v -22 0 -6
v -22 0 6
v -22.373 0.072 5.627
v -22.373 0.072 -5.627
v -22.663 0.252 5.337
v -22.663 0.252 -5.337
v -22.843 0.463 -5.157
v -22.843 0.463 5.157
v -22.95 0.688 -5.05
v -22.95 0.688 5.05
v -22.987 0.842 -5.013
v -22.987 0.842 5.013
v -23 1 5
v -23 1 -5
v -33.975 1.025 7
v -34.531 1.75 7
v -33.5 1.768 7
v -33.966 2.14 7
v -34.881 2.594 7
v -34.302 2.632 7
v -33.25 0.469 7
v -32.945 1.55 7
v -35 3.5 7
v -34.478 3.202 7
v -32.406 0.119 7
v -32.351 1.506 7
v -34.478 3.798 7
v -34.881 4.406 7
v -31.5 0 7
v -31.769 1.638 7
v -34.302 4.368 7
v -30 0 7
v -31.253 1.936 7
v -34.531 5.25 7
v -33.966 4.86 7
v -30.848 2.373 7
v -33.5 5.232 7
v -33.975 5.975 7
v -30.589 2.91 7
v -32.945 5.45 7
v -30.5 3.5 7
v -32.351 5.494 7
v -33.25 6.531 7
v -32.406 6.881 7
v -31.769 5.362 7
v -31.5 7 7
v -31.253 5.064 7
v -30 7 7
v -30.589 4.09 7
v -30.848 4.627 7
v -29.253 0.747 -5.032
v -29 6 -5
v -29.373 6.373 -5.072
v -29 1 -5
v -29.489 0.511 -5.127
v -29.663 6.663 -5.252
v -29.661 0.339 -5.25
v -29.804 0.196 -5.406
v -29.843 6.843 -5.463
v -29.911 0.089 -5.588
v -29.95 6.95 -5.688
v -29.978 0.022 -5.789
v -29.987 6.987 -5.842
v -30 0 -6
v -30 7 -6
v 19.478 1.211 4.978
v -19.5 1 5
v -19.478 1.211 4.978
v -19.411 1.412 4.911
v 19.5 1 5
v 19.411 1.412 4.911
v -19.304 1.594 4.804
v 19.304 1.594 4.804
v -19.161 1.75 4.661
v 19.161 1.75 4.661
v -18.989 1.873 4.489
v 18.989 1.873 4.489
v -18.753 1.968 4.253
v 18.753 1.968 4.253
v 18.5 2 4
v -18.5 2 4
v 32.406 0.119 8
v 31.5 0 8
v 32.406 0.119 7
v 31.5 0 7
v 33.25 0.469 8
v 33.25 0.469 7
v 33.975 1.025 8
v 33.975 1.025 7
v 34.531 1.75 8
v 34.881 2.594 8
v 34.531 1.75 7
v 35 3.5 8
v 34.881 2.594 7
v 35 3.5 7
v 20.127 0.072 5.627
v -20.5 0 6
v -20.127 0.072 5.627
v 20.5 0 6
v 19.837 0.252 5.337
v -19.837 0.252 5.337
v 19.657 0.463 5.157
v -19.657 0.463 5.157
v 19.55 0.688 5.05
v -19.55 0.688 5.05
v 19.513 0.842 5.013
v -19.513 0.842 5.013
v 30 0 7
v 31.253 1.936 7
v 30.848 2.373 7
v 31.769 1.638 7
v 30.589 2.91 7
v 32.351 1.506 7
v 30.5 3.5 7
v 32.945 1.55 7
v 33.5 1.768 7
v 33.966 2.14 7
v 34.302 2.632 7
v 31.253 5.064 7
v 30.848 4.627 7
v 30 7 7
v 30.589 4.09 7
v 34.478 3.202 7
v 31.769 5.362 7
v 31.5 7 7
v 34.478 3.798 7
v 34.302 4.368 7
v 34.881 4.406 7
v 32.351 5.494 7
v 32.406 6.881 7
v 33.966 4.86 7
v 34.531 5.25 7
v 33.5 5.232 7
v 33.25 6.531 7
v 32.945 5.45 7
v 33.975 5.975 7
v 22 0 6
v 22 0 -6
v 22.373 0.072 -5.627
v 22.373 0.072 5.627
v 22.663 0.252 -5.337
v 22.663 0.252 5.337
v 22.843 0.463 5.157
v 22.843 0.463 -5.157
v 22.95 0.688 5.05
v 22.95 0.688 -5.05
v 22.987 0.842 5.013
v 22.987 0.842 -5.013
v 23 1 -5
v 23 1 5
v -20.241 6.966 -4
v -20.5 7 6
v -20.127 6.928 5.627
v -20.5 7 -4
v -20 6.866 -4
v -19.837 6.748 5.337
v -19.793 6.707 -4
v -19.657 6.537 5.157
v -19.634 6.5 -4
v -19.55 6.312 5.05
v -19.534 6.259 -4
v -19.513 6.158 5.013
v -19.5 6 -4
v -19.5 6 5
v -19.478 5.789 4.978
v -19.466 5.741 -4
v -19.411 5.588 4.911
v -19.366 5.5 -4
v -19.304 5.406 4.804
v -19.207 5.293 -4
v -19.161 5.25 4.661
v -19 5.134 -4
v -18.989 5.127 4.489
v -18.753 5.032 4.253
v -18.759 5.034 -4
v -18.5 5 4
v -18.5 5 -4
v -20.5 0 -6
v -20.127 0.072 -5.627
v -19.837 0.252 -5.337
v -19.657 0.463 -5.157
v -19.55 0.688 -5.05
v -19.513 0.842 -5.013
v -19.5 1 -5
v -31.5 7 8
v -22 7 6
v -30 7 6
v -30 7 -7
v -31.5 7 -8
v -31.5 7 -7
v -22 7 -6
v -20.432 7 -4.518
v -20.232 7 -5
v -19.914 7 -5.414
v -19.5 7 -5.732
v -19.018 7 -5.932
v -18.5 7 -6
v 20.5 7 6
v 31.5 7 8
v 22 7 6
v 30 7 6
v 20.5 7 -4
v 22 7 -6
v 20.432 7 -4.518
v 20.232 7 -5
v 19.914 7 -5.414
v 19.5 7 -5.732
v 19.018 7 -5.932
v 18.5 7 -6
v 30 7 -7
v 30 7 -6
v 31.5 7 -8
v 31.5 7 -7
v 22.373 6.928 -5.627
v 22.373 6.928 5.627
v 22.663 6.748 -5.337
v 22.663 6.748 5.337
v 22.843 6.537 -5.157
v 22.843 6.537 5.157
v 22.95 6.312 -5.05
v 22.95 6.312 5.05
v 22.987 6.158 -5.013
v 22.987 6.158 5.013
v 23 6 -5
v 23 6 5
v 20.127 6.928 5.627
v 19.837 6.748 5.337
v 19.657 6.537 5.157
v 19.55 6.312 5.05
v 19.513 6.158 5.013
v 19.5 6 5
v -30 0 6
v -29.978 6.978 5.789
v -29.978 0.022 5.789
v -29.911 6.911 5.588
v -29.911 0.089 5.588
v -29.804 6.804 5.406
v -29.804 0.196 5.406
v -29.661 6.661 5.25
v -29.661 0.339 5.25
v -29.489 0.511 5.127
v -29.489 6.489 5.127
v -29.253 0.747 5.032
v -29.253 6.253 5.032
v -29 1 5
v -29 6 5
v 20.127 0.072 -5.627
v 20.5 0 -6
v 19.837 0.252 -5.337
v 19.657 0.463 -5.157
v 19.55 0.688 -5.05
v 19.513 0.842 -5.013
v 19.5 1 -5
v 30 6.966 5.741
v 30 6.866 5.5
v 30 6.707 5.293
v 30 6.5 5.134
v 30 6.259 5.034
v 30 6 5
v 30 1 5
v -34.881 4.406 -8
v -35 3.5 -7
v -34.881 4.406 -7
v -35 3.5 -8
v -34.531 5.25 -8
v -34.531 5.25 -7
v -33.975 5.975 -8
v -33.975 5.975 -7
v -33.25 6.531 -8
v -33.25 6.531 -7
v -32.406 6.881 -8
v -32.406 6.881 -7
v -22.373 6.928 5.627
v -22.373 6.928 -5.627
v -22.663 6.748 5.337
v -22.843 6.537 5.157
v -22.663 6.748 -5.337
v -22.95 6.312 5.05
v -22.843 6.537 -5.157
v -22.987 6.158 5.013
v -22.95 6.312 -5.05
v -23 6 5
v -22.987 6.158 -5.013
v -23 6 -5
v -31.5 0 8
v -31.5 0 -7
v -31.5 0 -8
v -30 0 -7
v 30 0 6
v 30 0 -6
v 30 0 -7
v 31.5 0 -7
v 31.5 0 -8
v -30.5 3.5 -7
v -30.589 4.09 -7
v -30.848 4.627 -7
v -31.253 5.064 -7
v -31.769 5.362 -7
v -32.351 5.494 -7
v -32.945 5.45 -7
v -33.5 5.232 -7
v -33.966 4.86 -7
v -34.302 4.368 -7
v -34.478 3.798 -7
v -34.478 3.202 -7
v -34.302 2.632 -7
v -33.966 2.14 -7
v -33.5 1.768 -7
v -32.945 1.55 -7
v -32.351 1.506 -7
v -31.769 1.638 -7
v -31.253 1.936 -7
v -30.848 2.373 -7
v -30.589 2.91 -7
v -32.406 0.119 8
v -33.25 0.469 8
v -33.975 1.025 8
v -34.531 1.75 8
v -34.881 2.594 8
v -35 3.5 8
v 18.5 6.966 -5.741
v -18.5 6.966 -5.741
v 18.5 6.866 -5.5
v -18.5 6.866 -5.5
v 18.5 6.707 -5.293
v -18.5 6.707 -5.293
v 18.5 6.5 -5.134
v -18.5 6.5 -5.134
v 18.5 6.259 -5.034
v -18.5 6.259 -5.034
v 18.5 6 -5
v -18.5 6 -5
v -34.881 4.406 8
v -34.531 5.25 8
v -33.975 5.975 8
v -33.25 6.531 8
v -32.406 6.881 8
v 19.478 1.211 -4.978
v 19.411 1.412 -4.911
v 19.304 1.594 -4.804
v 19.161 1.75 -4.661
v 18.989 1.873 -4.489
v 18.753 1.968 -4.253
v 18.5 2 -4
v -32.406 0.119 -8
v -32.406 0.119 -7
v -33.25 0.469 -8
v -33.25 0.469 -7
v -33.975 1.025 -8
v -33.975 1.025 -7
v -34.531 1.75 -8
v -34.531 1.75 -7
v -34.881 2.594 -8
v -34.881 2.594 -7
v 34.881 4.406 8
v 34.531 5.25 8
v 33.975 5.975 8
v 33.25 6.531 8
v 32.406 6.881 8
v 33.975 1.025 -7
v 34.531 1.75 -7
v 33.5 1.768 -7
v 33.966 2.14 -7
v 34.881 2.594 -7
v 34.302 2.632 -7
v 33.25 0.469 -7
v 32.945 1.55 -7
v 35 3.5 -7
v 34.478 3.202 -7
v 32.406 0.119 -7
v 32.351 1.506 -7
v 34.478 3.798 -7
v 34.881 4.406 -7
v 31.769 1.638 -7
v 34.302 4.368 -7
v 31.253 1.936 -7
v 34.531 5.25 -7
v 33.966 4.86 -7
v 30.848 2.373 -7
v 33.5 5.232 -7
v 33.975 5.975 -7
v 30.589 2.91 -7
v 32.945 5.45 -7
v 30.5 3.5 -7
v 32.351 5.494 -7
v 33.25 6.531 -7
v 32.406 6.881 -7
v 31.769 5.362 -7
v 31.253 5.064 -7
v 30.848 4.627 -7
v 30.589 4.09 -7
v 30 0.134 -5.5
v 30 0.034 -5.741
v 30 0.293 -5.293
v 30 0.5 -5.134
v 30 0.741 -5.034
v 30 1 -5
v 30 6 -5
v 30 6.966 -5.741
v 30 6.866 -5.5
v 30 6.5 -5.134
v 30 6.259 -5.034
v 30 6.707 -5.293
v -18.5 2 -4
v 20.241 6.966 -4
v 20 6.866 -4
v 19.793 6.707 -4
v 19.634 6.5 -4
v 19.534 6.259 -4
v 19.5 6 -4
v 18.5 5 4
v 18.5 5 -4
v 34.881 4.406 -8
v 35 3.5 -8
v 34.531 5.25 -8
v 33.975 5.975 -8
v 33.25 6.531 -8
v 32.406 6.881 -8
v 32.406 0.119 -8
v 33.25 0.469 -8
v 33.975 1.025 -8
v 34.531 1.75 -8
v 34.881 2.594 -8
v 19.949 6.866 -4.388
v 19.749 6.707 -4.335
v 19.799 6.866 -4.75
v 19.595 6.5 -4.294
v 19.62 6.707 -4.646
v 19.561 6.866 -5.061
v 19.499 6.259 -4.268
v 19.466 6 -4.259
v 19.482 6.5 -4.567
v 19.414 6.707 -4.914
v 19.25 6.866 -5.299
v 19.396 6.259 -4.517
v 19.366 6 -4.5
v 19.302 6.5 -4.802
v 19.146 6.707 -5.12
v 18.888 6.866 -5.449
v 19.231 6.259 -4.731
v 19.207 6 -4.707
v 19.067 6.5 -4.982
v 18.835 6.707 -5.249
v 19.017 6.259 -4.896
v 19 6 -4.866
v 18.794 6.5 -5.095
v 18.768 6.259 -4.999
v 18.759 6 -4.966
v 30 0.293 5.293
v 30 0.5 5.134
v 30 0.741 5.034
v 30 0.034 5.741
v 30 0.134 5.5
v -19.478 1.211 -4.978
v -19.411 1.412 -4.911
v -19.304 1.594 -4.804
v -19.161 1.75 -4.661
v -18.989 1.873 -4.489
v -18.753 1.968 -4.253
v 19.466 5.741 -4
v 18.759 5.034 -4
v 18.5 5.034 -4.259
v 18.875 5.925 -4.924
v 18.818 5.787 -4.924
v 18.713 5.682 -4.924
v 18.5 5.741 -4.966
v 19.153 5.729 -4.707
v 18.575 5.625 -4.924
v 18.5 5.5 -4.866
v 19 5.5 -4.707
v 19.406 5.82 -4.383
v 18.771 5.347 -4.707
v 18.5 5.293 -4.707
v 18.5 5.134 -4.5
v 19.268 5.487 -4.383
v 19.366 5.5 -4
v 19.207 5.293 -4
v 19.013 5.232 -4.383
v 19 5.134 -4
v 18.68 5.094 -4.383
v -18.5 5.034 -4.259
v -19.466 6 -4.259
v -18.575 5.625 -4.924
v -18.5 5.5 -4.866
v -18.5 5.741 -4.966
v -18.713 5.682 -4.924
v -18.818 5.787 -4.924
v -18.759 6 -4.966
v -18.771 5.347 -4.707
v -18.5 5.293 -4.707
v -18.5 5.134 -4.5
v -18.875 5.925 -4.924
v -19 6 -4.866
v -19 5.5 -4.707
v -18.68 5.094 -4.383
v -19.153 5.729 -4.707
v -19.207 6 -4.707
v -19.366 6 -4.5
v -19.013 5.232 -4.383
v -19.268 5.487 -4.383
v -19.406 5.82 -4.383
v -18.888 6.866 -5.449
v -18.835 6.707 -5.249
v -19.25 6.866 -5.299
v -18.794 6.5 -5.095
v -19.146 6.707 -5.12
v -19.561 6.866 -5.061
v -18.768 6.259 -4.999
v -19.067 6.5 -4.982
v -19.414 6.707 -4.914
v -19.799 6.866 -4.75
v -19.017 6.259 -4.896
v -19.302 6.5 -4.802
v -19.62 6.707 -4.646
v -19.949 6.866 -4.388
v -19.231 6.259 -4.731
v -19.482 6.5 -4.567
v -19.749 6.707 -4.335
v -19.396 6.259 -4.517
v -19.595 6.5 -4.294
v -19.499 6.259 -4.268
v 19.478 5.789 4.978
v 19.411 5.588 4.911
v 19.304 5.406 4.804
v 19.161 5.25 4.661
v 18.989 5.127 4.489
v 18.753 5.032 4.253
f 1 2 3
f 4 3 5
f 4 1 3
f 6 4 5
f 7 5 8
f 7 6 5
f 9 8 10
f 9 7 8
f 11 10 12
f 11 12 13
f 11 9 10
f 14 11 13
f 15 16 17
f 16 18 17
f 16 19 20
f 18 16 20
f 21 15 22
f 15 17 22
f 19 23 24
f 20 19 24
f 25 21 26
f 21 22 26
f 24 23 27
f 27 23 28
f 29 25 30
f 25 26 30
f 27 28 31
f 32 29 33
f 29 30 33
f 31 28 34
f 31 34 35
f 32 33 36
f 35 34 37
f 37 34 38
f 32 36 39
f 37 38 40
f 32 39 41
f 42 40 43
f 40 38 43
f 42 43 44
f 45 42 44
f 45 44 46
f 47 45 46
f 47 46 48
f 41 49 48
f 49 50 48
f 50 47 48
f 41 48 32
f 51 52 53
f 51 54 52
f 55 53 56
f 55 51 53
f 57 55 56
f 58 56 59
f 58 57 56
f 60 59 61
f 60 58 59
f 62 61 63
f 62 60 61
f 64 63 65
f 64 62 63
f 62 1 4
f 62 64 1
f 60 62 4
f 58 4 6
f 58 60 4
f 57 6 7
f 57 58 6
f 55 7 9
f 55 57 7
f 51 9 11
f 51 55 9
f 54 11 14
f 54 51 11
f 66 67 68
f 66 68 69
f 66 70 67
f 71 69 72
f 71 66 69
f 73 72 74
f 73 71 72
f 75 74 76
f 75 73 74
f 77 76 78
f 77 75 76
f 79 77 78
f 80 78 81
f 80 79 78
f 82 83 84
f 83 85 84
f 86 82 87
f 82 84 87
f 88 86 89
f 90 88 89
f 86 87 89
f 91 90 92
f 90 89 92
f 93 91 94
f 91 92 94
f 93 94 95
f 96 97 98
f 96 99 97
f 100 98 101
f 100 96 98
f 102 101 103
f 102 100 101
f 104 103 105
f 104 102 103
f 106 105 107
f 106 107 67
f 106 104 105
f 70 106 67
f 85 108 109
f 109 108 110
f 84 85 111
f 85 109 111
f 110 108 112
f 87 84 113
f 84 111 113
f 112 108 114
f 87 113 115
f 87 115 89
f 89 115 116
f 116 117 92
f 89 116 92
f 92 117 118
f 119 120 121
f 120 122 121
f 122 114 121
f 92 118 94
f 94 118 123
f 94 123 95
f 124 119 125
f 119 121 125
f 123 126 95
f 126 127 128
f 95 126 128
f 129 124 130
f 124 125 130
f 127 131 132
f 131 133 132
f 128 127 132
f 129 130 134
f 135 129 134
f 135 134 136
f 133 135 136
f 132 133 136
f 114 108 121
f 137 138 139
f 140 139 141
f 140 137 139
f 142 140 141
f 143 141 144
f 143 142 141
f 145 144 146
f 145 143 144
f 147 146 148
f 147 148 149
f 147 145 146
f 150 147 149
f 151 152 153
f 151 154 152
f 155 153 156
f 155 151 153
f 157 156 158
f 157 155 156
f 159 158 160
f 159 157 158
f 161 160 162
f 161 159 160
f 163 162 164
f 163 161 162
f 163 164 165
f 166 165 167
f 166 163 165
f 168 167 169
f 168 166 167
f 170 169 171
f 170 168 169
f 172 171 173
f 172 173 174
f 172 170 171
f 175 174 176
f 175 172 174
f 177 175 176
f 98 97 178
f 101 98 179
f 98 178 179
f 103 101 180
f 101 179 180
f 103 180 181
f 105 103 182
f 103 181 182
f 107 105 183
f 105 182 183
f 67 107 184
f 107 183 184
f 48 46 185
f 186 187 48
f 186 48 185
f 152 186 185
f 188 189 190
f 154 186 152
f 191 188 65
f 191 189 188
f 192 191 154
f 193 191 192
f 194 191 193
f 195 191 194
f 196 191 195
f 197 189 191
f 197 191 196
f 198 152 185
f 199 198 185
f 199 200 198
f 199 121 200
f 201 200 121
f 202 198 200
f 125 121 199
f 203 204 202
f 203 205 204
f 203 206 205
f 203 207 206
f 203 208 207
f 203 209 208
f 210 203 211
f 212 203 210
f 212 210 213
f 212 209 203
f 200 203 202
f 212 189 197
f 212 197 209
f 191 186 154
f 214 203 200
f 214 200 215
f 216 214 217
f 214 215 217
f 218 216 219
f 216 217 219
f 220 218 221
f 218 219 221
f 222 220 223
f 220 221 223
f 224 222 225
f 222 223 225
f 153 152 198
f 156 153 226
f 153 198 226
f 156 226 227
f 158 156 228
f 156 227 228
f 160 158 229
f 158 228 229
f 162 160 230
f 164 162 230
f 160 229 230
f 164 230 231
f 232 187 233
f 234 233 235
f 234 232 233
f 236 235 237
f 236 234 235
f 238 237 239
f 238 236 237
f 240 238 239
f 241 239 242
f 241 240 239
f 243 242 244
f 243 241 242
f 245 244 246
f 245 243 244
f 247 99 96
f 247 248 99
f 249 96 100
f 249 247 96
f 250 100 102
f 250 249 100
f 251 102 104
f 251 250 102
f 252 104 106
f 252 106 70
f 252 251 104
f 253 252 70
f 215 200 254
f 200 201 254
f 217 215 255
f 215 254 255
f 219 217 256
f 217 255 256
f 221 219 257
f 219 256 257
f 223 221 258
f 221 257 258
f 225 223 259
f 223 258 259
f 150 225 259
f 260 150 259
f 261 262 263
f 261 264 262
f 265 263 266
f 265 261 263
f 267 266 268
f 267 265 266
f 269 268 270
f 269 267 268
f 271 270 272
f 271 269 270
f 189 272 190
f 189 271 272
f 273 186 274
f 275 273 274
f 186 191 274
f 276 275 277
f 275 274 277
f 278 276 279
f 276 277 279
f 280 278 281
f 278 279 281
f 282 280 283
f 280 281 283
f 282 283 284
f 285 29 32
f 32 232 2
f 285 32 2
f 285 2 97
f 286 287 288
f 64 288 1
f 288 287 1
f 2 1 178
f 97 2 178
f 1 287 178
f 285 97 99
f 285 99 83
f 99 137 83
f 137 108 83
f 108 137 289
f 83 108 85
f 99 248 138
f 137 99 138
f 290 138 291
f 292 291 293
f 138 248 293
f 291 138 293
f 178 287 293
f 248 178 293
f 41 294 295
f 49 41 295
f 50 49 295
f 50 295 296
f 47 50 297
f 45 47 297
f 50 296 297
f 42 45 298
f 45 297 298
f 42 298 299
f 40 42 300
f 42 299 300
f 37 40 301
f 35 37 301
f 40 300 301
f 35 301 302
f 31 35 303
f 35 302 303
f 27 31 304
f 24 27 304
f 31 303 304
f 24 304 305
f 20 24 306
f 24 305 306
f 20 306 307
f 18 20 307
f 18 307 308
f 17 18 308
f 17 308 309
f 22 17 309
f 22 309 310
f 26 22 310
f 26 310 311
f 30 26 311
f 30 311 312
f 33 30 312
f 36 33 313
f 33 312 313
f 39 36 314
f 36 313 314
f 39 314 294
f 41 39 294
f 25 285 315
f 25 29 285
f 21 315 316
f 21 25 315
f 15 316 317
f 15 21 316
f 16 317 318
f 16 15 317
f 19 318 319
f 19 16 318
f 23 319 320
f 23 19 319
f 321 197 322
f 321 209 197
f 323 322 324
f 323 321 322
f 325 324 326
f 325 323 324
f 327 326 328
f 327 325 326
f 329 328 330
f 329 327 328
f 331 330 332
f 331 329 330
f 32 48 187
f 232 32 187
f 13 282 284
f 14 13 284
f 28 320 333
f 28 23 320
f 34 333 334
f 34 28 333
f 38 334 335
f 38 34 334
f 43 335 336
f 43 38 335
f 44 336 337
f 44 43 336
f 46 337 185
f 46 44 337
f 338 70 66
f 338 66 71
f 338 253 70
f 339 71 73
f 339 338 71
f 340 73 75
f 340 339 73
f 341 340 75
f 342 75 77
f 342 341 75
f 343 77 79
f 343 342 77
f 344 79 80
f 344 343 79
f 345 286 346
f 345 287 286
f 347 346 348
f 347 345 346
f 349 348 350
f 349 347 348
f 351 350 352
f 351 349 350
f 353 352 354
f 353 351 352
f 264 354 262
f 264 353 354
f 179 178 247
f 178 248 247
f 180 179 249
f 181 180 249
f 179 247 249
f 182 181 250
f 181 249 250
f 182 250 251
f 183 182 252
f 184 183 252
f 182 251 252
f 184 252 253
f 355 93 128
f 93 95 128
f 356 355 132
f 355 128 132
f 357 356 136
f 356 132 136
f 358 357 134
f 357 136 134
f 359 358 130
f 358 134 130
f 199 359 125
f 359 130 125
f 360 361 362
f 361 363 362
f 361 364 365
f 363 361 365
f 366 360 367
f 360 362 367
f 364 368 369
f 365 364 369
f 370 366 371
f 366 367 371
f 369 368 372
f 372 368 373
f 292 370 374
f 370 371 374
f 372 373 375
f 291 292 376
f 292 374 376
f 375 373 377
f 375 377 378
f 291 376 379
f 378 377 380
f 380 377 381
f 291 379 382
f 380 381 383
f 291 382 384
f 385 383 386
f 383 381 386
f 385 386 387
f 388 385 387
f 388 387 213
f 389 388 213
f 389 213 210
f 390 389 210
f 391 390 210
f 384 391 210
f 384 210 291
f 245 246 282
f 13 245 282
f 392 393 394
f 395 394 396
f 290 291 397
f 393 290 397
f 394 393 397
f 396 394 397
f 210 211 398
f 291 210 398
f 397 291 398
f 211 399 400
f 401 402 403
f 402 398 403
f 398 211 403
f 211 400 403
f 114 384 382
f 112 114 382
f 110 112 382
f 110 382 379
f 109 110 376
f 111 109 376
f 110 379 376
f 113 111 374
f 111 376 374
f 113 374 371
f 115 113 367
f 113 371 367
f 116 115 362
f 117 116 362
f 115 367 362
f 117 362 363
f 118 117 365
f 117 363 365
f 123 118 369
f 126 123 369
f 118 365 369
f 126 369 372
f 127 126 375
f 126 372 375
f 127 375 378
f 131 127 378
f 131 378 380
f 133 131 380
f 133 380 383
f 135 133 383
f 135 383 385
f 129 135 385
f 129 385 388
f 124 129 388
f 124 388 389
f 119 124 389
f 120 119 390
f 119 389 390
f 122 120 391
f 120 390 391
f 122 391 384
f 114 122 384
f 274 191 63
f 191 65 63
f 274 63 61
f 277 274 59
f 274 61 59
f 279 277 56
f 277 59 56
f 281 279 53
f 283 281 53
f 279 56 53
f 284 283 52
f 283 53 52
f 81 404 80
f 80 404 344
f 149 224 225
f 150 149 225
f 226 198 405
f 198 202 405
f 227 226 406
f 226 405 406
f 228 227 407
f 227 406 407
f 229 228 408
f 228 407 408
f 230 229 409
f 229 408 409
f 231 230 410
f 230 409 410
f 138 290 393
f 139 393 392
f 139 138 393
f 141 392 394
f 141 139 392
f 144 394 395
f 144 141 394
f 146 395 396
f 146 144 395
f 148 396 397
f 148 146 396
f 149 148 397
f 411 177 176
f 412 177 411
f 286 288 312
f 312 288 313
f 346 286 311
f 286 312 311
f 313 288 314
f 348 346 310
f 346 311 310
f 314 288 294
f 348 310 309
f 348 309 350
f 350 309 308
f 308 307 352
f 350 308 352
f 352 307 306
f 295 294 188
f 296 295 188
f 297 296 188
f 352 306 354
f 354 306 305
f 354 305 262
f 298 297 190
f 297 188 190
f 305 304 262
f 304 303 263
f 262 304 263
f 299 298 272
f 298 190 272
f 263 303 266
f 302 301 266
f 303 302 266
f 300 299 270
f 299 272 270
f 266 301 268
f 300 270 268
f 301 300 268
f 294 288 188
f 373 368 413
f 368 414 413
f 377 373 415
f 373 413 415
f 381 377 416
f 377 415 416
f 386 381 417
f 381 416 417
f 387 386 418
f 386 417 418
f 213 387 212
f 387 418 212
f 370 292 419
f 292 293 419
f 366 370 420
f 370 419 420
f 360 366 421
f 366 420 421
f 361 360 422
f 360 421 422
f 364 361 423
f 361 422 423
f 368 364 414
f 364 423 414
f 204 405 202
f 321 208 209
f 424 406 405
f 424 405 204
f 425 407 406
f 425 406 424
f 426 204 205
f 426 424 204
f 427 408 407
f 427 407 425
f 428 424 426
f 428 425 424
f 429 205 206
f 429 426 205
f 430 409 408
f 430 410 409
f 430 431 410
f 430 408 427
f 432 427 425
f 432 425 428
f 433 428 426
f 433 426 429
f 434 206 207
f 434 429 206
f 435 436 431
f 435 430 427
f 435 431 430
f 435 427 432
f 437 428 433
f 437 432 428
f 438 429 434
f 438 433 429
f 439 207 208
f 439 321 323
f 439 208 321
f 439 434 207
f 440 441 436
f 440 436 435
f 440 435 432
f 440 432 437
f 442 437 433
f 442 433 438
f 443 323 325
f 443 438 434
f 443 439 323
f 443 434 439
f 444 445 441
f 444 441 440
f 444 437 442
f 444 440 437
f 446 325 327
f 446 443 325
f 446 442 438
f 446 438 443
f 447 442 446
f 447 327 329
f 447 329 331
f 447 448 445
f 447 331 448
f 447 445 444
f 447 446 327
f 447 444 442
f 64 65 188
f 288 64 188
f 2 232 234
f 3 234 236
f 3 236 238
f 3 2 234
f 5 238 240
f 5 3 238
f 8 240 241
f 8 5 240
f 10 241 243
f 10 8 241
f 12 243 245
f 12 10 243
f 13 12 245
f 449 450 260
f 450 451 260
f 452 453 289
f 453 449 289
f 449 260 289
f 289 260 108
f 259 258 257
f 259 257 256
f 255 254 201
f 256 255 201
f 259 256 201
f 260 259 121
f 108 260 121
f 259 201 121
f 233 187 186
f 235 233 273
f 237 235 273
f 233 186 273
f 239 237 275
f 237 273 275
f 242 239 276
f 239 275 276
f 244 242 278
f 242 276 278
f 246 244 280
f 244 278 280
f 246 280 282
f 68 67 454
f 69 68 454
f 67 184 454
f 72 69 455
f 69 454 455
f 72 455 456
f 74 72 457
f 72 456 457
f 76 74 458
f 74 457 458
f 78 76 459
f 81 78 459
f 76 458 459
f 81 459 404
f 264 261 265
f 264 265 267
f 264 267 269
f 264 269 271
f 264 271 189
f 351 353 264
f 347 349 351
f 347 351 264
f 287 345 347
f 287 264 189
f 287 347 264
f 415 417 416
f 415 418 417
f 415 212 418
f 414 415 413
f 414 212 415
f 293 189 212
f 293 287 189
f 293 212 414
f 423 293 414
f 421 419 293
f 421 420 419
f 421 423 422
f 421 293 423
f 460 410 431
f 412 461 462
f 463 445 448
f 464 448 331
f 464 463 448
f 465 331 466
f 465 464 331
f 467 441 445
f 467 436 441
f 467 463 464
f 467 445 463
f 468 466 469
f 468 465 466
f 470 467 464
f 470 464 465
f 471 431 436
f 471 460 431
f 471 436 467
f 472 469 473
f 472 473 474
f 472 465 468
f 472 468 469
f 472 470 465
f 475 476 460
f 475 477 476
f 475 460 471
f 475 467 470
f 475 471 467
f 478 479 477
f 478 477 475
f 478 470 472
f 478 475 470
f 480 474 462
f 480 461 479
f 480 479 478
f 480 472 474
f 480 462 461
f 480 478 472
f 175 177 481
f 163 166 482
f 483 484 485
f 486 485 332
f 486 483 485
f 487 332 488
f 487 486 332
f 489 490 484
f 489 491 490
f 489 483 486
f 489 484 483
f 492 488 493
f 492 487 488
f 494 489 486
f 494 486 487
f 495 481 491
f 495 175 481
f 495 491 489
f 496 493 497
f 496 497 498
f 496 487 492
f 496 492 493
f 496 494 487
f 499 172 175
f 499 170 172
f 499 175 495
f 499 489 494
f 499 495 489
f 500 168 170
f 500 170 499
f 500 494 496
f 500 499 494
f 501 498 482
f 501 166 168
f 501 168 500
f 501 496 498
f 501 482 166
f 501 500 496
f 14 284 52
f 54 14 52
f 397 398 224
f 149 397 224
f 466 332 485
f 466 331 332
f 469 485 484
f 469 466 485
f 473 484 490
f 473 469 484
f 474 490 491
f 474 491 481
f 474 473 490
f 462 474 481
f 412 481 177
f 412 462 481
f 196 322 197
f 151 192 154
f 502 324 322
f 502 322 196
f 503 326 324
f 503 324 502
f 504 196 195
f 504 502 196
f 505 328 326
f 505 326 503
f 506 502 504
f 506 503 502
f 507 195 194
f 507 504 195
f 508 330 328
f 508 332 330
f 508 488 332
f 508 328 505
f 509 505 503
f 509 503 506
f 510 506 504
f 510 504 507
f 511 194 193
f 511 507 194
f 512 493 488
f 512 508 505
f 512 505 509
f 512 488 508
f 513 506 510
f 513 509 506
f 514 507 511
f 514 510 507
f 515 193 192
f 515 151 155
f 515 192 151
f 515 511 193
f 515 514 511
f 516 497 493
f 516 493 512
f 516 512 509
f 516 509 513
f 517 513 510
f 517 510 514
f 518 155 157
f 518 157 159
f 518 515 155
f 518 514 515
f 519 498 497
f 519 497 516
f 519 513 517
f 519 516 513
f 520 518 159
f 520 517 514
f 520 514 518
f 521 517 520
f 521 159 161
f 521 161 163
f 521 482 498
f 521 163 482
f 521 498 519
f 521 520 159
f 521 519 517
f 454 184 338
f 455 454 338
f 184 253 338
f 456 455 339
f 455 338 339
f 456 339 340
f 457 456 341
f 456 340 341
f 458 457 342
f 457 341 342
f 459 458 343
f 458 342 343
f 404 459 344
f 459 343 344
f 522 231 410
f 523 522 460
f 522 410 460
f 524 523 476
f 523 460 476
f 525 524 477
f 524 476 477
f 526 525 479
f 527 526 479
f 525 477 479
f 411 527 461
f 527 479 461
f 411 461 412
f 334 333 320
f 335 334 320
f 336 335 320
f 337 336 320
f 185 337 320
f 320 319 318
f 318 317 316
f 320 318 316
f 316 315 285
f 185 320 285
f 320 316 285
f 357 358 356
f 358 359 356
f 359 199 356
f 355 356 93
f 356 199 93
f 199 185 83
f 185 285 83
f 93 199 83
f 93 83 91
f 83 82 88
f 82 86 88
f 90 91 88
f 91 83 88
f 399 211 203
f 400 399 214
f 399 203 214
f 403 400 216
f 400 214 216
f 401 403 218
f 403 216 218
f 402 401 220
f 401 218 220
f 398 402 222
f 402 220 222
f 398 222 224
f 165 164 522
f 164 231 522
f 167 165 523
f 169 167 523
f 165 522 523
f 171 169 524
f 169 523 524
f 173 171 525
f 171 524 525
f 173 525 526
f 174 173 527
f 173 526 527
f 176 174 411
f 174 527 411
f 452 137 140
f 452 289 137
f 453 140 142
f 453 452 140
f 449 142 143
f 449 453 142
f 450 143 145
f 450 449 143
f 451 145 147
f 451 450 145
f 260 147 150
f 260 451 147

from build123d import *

# Parameters (mm, degrees)
SKETCH1_W           = 70
SKETCH1_H           = 16
BOSS_EXTRUDE1_DEPTH = 7
CUT_EXTRUDE1_DEPTH  = 17
SKETCH3_R           = 2
BOSS_EXTRUDE2_DEPTH = 14
SKETCH4_W           = 39
SKETCH4_H           = 10
CUT_EXTRUDE2_DEPTH  = 2
FILLET1_R           = 1
FILLET2_R           = 3.5


with BuildPart() as part:
    # Sketch1 → Boss-Extrude1 (new body)
    with BuildSketch(Plane(origin=(0, 0, 0), x_dir=(1, 0, 0), z_dir=(0, 1, 0))):
        Rectangle(SKETCH1_W, SKETCH1_H)
    extrude(amount=BOSS_EXTRUDE1_DEPTH)

    # Sketch2 → Cut-Extrude1 (cut)
    with BuildSketch(Plane(origin=(0, 7, 0), x_dir=(1, 0, 0), z_dir=(0, 1, 0))):
        Polygon((-30, 7), (-35, 7), (-35, -7), (-30, -7), (-30, -5), (-23, -5), (-23, 5), (-30, 5), align=None)
        Polygon((30, -5), (30, -7), (35, -7), (35, 7), (30, 7), (30, 5), (23, 5), (23, -5), align=None)
    extrude(amount=-CUT_EXTRUDE1_DEPTH, mode=Mode.SUBTRACT)

    # Sketch3 → Boss-Extrude2 (add)
    with BuildSketch(Plane.XY.offset(-7)):
        with Locations((-32.5, 3.5)):
            Circle(SKETCH3_R)
        with Locations(Location((32.5, 3.5, 0), (0, 0, 180))):
            Circle(SKETCH3_R)
    extrude(amount=BOSS_EXTRUDE2_DEPTH)

    # Sketch4 → Cut-Extrude2 (cut)
    with BuildSketch(Plane(origin=(0, 7, 0), x_dir=(1, 0, 0), z_dir=(0, 1, 0))):
        Rectangle(SKETCH4_W, SKETCH4_H)
    cut_extrude2 = extrude(amount=-CUT_EXTRUDE2_DEPTH, mode=Mode.SUBTRACT)

    # Mirror1: Cut-Extrude2 across plane
    add(cut_extrude2.mirror(Plane.ZX.offset(3.5)), mode=Mode.SUBTRACT)

    # Fillet1
    fillet1_edges = [part.edges().sort_by_distance(p)[0] for p in [
        (19.5, 0, 0),
        (0, 0, -5),
        (-19.5, 0, 0),
        (0, 0, 5),
        (19.5, 2, 0),
        (0, 2, -5),
        (-19.5, 2, 0),
        (0, 2, 5),
        (26.5, 0, -5),
        (23, 0, 0),
        (26.5, 0, 5),
        (-26.5, 0, -5),
        (-23, 0, 0),
        (-26.5, 0, 5),
        (-23, 7, 0),
        (-30, 3.5, 5),
        (-30, 3.5, -5),
        (-26.5, 7, -5),
        (-26.5, 7, 5),
        (26.5, 7, 5),
        (26.5, 7, -5),
        (23, 7, 0),
        (19.5, 5, 0),
        (19.5, 6, -5),
        (0, 5, 5),
        (-19.5, 5, 0),
        (0, 5, -5),
        (-19.5, 6, -5),
        (19.5, 7, 0),
        (0, 7, -5),
        (-19.5, 7, 0),
        (0, 7, 5),
    ]]
    fillet(fillet1_edges, radius=FILLET1_R - 0.0001)  # a hair under: the kernel refuses the full size

    # Fillet2
    fillet2_edges = [part.edges().sort_by_distance(p)[0] for p in [
        (-35, 7, 7.5),
        (-35, 0, 7.5),
        (-35, 0, -7.5),
        (-35, 7, -7.5),
        (35, 0, -7.5),
        (35, 7, -7.5),
        (35, 0, 7.5),
        (35, 7, 7.5),
    ]]
    fillet(fillet2_edges, radius=FILLET2_R - 0.0001)  # a hair under: the kernel refuses the full size


solid = part.part
